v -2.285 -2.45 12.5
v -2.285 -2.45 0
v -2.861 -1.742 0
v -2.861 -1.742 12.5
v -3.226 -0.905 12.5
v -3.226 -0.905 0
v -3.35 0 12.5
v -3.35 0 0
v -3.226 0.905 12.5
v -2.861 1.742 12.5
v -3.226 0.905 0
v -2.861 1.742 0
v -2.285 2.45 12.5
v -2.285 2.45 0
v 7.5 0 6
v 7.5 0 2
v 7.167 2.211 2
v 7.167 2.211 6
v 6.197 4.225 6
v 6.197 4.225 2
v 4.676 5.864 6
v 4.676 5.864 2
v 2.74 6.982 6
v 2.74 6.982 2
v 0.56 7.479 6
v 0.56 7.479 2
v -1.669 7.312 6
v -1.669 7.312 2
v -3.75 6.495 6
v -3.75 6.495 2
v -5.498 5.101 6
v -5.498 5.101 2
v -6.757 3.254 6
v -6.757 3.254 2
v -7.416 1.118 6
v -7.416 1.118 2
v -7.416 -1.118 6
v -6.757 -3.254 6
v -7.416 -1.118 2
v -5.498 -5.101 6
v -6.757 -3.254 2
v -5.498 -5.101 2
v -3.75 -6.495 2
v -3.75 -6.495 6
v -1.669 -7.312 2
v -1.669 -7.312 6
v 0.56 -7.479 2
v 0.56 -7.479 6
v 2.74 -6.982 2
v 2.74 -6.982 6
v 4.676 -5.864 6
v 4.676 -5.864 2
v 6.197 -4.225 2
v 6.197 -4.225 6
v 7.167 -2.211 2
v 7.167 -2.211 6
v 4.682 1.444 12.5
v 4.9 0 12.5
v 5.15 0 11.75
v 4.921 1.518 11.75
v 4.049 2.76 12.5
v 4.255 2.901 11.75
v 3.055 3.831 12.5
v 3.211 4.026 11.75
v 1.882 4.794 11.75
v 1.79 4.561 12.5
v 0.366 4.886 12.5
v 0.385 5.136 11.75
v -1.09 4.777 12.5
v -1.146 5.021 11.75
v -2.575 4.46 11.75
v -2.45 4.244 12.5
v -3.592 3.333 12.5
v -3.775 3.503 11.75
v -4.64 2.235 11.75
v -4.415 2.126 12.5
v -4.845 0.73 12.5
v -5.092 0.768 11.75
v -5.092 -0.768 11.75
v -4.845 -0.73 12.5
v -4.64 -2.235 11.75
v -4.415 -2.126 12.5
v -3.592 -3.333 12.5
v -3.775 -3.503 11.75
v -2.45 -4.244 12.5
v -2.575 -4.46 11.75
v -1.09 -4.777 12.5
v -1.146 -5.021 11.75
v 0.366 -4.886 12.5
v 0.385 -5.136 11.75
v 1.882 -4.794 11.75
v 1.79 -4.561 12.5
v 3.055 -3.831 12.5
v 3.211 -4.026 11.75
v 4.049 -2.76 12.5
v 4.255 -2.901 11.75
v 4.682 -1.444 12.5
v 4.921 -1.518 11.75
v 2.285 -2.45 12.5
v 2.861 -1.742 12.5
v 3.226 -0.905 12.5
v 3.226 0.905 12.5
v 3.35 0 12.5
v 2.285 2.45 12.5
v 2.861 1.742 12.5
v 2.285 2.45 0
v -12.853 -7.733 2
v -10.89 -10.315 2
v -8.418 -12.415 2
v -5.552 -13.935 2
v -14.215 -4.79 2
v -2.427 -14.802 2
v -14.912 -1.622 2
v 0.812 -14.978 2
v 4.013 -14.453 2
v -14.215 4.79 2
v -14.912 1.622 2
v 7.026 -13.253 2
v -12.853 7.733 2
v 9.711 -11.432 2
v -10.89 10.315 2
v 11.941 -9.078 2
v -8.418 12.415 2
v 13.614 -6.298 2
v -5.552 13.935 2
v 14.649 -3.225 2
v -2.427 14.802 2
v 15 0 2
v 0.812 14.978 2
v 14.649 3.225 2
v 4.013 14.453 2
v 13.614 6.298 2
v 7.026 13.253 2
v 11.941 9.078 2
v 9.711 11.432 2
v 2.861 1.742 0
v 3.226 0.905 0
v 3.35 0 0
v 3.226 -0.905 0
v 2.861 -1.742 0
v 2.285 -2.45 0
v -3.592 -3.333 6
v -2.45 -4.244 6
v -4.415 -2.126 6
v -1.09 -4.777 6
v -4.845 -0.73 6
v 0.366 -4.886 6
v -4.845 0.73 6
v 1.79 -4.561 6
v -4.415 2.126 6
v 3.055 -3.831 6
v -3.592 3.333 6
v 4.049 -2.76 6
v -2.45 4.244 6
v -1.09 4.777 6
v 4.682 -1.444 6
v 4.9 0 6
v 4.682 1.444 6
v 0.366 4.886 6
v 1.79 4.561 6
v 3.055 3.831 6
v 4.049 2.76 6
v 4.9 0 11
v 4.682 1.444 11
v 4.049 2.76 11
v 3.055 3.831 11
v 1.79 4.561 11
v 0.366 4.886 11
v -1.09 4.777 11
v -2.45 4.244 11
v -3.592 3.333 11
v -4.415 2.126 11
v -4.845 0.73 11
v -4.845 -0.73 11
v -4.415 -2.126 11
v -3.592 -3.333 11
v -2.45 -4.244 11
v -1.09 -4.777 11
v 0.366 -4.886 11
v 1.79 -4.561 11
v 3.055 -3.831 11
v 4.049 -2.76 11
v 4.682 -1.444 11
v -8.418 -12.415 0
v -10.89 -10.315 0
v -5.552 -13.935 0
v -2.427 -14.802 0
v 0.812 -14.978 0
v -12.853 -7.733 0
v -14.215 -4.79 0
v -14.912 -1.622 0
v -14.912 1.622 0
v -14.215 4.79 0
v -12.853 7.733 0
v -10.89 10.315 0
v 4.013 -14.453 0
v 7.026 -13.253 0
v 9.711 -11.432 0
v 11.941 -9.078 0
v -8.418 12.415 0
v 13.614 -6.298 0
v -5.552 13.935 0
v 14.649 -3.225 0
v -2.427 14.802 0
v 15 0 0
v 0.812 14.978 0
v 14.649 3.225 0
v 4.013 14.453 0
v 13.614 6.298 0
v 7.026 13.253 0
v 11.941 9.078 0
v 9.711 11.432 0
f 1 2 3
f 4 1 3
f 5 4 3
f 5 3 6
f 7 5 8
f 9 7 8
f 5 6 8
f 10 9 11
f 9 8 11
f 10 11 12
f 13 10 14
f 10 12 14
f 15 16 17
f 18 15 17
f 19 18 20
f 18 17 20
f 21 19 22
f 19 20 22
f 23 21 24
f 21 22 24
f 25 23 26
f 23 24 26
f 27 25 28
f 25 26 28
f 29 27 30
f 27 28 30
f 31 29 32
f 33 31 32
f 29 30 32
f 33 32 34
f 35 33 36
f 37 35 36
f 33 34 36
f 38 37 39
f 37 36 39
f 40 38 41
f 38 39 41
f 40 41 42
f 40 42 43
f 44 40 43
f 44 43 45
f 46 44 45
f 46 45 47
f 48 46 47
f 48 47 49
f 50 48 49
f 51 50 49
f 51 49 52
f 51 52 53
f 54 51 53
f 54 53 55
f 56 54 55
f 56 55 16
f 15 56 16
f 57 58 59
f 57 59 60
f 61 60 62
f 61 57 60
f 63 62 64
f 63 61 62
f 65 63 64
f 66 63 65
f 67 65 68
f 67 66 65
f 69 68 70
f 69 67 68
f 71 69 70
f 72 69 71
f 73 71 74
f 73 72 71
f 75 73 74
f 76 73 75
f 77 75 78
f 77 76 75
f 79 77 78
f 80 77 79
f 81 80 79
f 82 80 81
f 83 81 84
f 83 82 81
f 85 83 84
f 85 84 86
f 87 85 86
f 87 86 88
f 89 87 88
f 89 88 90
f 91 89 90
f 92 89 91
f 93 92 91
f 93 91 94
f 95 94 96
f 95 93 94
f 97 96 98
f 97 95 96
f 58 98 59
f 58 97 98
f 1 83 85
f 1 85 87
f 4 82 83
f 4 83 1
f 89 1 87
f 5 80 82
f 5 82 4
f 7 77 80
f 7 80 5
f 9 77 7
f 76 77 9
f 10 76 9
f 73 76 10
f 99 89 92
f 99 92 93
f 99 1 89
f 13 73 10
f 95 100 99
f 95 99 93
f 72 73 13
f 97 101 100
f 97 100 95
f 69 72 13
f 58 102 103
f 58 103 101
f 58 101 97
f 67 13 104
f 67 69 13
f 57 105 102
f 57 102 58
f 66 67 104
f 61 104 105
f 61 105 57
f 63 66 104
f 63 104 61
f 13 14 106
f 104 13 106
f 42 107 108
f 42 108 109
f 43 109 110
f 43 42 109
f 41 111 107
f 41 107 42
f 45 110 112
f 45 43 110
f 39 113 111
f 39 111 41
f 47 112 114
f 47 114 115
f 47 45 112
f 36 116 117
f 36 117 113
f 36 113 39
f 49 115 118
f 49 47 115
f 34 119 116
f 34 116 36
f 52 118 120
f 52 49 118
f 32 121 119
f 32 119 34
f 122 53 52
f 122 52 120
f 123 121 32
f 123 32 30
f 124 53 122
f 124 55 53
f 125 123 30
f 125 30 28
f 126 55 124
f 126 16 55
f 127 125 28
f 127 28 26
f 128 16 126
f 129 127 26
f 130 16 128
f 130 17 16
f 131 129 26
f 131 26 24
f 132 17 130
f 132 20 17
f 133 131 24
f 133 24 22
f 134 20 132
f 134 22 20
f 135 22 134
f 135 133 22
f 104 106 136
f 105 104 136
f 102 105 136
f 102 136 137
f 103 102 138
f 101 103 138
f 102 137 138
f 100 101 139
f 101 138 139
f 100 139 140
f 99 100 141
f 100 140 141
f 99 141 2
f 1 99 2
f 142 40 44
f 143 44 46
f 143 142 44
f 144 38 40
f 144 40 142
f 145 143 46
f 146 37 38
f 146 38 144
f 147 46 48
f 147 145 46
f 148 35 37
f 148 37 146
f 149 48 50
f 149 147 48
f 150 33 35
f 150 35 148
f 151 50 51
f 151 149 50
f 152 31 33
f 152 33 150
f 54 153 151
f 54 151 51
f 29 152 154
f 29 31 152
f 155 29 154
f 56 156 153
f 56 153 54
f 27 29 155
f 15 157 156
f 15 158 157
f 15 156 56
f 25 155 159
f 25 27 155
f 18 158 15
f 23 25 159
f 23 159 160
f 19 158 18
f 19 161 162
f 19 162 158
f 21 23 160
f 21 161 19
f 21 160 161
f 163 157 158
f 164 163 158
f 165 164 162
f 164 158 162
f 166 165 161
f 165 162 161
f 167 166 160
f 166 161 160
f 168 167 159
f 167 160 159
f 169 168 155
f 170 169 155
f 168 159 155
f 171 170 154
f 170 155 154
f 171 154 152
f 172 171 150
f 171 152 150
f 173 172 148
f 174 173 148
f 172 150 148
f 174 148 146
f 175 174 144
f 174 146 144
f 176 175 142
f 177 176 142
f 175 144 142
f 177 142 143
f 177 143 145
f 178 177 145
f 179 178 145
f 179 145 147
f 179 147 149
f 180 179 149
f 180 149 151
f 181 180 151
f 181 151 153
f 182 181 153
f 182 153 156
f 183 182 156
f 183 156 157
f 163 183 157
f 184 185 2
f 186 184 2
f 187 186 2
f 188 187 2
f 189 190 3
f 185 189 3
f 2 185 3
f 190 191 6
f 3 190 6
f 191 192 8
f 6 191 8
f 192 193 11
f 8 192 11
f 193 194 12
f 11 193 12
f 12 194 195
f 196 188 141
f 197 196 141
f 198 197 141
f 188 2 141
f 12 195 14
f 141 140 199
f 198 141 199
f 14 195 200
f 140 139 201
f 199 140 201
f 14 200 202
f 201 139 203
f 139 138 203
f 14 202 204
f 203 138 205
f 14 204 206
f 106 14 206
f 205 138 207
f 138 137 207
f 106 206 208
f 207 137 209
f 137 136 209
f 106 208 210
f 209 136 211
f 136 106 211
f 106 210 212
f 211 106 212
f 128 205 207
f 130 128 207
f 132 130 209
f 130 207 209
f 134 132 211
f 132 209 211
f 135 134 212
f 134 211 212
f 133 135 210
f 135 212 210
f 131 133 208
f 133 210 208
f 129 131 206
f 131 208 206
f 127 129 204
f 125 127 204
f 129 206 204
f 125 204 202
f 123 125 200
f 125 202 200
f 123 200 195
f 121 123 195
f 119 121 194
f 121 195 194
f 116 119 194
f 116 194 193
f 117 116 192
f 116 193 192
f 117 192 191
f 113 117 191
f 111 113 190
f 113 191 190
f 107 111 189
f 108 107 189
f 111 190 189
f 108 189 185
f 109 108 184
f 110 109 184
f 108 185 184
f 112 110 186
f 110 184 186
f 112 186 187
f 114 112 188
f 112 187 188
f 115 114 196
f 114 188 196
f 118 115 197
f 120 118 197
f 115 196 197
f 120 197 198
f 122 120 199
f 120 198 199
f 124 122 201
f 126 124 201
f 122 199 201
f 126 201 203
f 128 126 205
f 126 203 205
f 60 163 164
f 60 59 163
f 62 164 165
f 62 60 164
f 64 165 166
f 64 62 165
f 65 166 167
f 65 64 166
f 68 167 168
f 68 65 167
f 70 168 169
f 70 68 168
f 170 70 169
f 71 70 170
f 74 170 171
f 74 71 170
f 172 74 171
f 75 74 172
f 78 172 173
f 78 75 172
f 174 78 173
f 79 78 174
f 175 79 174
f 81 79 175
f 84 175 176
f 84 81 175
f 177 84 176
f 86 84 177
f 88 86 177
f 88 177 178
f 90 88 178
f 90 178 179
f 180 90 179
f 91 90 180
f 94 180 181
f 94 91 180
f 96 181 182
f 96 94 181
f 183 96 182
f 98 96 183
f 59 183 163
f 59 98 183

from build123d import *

# Parameters (mm, degrees)
F3_R     = 15
F3_R_2   = 7.5
F3_R_3   = 4.9
F4_DEPTH = 2
F5_DEPTH = 6
F6_DEPTH = 12.5


with BuildPart() as f4:
    # F3 (on Top) → F4 (new body)
    with BuildSketch(Plane.XY):
        Circle(F3_R)
        Circle(F3_R_2, mode=Mode.SUBTRACT)
        Circle(F3_R_2)
        Circle(F3_R_3, mode=Mode.SUBTRACT)
        Circle(F3_R_3)
        with BuildLine():
            ThreePointArc((-2.2847319318, -2.45), (-3.35, 0), (-2.2847319318, 2.45))
            Line((-2.2847319318, 2.45), (2.2847319318, 2.45))
            ThreePointArc((2.2847319318, 2.45), (3.35, 0), (2.2847319318, -2.45))
            Line((2.2847319318, -2.45), (-2.2847319318, -2.45))
        make_face(mode=Mode.SUBTRACT)
    extrude(amount=F4_DEPTH)

    # F3 (on Top) → F5 (join)
    with BuildSketch(Plane.XY):
        Circle(F3_R_2)
        Circle(F3_R_3, mode=Mode.SUBTRACT)
        Circle(F3_R_3)
        with BuildLine():
            ThreePointArc((-2.2847319318, -2.45), (-3.35, 0), (-2.2847319318, 2.45))
            Line((-2.2847319318, 2.45), (2.2847319318, 2.45))
            ThreePointArc((2.2847319318, 2.45), (3.35, 0), (2.2847319318, -2.45))
            Line((2.2847319318, -2.45), (-2.2847319318, -2.45))
        make_face(mode=Mode.SUBTRACT)
    extrude(amount=F5_DEPTH)

    # F3 (on Top) → F6 (join)
    with BuildSketch(Plane.XY):
        Circle(F3_R_3)
        with BuildLine():
            ThreePointArc((-2.2847319318, -2.45), (-3.35, 0), (-2.2847319318, 2.45))
            Line((-2.2847319318, 2.45), (2.2847319318, 2.45))
            ThreePointArc((2.2847319318, 2.45), (3.35, 0), (2.2847319318, -2.45))
            Line((2.2847319318, -2.45), (-2.2847319318, -2.45))
        make_face(mode=Mode.SUBTRACT)
    extrude(amount=F6_DEPTH)

    # F7 (on Front) → F8 (revolve)
    with BuildSketch(Plane.XZ):
        Polygon((5.15, 11.75), (4.9, 12.5), (4.9, 11), align=None)
    revolve(axis=Axis((0, 0, 8.7542282417), (0, 0, 1)))


solid = f4.part
